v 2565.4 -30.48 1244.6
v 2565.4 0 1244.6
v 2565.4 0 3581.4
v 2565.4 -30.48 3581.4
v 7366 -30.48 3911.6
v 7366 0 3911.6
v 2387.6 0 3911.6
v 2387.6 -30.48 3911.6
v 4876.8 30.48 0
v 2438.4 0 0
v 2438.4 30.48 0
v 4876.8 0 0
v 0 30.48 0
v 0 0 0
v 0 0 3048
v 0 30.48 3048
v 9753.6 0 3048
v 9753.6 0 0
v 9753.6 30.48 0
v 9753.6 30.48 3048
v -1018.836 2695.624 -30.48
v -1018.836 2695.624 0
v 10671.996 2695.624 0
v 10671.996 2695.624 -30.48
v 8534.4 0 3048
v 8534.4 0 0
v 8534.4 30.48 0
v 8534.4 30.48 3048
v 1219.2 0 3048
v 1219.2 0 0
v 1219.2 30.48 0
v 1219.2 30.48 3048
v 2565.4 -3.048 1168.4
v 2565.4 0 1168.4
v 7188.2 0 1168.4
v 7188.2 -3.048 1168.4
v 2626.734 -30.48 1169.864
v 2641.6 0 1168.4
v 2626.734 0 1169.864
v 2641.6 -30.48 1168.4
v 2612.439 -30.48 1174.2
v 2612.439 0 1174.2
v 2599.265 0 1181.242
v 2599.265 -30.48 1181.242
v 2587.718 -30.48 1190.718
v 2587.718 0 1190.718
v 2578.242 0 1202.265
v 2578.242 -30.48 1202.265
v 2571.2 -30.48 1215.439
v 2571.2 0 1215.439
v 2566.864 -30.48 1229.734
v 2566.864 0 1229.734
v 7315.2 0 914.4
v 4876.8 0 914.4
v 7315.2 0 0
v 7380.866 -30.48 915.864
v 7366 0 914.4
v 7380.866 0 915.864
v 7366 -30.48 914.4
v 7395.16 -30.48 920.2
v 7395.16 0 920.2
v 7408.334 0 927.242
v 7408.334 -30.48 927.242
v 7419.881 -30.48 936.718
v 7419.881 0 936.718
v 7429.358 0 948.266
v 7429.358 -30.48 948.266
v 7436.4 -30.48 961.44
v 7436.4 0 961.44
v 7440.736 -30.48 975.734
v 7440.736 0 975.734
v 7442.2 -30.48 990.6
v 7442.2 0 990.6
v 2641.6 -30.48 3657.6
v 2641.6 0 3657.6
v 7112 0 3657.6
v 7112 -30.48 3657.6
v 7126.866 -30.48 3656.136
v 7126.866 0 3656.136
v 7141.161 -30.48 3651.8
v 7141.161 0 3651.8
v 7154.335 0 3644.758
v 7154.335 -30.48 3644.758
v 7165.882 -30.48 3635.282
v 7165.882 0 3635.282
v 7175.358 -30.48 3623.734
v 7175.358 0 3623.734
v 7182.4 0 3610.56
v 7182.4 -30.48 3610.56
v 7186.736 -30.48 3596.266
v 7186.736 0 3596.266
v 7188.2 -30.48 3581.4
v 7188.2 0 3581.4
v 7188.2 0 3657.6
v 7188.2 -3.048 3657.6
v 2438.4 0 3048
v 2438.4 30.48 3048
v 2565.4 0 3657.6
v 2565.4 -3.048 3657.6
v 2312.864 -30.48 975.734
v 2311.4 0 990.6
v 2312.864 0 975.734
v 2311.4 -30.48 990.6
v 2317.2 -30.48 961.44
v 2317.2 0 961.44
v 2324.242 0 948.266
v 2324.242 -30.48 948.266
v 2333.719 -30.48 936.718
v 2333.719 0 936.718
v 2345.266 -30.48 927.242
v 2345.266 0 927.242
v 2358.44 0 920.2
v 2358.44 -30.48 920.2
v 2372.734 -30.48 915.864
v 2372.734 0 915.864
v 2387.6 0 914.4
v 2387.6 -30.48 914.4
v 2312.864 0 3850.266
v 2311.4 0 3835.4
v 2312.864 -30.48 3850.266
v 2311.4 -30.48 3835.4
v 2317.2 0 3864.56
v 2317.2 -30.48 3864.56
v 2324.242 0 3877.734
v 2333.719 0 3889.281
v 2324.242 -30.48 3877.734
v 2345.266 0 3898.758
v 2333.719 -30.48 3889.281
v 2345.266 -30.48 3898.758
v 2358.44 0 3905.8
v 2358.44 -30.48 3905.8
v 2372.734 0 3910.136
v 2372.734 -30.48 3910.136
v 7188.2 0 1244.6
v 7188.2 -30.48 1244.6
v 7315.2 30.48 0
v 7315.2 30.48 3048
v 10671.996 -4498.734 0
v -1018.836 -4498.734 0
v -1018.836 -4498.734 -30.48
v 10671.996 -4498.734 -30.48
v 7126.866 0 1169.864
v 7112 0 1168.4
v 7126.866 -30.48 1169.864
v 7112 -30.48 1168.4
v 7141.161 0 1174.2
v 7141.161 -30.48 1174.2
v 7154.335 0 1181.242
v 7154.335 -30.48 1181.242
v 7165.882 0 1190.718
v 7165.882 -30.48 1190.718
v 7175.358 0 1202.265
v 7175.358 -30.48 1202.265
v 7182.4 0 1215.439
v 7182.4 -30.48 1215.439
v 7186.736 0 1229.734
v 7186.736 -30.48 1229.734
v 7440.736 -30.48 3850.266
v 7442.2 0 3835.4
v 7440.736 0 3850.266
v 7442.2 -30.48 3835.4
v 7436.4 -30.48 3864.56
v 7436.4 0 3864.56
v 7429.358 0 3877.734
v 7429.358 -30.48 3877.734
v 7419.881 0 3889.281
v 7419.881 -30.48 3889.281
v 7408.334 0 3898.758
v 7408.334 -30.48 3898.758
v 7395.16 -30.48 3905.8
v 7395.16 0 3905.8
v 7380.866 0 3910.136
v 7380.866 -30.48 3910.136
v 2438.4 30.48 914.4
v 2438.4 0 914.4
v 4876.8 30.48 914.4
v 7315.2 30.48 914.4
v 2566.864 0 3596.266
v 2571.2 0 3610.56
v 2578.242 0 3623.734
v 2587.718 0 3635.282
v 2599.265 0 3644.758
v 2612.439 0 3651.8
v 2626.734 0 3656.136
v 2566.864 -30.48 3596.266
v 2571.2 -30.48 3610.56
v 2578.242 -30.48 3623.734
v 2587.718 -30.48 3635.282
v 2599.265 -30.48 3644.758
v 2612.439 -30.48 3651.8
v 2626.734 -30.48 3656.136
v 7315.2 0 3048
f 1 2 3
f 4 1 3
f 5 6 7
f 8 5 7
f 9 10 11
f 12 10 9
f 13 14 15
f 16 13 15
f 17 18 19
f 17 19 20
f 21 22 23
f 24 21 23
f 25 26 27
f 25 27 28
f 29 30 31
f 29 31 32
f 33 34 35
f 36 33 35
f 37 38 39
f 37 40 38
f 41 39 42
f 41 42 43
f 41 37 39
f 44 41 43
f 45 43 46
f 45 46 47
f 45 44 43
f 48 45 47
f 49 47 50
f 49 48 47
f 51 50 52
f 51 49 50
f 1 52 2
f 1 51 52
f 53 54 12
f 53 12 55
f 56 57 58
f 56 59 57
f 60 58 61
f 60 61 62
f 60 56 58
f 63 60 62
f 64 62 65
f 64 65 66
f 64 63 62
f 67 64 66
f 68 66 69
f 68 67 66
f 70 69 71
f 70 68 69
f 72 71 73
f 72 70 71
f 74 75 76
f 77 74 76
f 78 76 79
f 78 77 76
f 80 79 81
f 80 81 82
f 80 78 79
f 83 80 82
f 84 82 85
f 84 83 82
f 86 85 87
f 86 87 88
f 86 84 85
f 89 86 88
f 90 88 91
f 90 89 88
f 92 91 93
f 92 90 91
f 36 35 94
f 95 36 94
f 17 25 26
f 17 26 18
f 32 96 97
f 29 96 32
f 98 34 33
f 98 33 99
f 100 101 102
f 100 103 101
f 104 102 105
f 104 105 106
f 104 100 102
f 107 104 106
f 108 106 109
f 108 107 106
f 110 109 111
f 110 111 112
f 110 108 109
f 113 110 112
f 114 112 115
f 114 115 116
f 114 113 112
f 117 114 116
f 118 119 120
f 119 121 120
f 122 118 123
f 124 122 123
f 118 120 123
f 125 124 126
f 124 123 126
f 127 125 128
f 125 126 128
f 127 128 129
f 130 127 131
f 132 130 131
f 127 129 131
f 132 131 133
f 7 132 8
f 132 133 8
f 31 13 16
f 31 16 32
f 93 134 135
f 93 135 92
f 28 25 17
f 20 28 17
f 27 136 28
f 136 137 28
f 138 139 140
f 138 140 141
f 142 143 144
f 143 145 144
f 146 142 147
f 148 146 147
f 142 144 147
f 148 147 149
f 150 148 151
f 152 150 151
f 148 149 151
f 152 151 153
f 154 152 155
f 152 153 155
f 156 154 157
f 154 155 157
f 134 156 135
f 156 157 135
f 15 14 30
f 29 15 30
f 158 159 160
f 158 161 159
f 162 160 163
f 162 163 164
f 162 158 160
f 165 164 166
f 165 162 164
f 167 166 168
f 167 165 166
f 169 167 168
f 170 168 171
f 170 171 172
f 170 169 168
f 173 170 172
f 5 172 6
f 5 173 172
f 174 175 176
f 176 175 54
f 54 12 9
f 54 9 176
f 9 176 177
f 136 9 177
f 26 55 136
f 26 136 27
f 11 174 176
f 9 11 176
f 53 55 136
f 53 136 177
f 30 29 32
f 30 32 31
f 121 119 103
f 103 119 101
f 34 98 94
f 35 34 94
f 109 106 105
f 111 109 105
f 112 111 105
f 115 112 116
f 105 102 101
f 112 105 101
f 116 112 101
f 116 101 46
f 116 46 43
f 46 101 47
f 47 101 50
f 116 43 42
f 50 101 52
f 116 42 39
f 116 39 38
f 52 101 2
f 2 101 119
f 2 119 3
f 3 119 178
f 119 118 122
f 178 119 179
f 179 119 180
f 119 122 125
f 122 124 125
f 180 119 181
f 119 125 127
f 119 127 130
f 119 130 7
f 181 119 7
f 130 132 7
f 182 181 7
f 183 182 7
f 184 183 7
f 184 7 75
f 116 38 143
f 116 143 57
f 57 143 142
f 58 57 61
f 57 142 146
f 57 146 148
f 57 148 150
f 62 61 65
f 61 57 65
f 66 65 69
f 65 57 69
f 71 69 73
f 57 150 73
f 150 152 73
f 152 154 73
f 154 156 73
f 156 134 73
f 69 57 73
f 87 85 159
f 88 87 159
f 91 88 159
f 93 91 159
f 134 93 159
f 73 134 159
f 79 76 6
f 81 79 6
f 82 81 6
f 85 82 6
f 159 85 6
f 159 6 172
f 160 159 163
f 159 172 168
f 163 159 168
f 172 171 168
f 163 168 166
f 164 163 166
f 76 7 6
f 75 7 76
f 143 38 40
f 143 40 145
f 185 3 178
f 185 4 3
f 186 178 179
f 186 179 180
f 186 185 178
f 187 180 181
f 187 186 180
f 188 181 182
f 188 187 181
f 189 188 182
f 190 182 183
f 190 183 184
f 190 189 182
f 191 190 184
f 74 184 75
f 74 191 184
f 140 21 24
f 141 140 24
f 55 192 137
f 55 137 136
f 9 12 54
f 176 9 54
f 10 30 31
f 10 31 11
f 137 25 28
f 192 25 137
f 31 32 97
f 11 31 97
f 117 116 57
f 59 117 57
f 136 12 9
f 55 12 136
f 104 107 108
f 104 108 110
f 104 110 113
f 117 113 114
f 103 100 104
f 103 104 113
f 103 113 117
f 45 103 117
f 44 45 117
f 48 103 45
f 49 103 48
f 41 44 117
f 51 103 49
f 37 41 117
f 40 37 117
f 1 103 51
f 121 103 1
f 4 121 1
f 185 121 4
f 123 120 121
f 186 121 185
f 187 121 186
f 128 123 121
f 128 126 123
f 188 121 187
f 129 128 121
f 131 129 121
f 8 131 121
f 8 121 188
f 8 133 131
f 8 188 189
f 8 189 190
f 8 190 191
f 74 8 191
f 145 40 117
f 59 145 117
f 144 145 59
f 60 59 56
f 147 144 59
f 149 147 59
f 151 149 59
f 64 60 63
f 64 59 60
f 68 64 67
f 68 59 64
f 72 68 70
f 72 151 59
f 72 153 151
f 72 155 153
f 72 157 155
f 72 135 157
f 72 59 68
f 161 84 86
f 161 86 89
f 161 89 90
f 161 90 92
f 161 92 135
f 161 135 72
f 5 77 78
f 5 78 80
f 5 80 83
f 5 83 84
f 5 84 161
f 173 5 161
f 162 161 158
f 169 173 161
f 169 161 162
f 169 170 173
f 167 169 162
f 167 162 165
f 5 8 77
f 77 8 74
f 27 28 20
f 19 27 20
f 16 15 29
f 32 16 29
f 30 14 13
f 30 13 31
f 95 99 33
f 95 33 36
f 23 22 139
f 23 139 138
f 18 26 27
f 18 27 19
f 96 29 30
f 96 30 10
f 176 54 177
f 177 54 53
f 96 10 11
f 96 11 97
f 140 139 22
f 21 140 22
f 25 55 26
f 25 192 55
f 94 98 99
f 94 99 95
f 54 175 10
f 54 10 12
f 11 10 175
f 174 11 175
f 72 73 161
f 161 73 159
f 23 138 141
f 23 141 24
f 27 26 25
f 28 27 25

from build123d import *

# Parameters (mm, degrees)
F0_W     = 1219.2
F0_H     = 3048
F1_DEPTH = 30.48
F0_W_2   = 2438.4
F0_H_2   = 914.4
F0_W_3   = 126.9999492
F0_H_3   = 2133.6
F2_DEPTH = 30.48
F0_W_4   = 4622.8001016
F0_H_4   = 2489.2001016
F3_DEPTH = 30.48
F4_DEPTH = 3.048
F5_R     = 76.2
F6_W     = 11690.8322572708
F6_H     = 7194.3583488464
F7_DEPTH = 30.48


with BuildPart() as f1:
    # F0 (on Front) → F1 (new body)
    with BuildSketch(Plane.XZ):
        with Locations((609.6, 1524)):
            Rectangle(F0_W, F0_H)
    extrude(amount=-F1_DEPTH)


with BuildPart() as f1b:
    # F0 (on Front) → F1, piece 2 (new body)
    with BuildSketch(Plane.XZ):
        with Locations((3657.6, 457.2)):
            Rectangle(F0_W_2, F0_H_2)
    extrude(amount=-F1_DEPTH)


with BuildPart() as f1c:
    # F0 (on Front) → F1, piece 3 (new body)
    with BuildSketch(Plane.XZ):
        Polygon((7315.2, 914.4), (7315.2, 0), (8534.4, 0), (8534.4, 3048), (7442.1999492, 3048), (7442.1999492, 914.4), align=None)
        with Locations((7378.6999746, 1981.2)):
            Rectangle(F0_W_3, F0_H_3)
    extrude(amount=-F1_DEPTH)


with BuildPart() as f2:
    # F0 (on Front) → F2 (new body)
    with BuildSketch(Plane.XZ):
        Polygon((1219.2, 3048), (1219.2, 0), (2438.4, 0), (2438.4, 914.4), (2311.4000508, 914.4), (2311.4000508, 3048), align=None)
        with Locations((2374.9000254, 1981.2)):
            Rectangle(F0_W_3, F0_H_3)
    extrude(amount=-F2_DEPTH)


with BuildPart() as f2b:
    # F0 (on Front) → F2, piece 2 (new body)
    with BuildSketch(Plane.XZ):
        with Locations((6096, 457.2)):
            Rectangle(F0_W_2, F0_H_2)
    extrude(amount=-F2_DEPTH)


with BuildPart() as f2c:
    # F0 (on Front) → F2, piece 3 (new body)
    with BuildSketch(Plane.XZ):
        with Locations((9144, 1524)):
            Rectangle(F0_W, F0_H)
    extrude(amount=-F2_DEPTH)


with BuildPart() as f3:
    # F0 (on Front) → F3 (new body)
    with BuildSketch(Plane.XZ):
        Polygon((2311.4000508, 3911.5998984), (2311.4000508, 3048), (2438.4, 3048), (2438.4, 914.4), (4876.8, 914.4), (7315.2, 914.4), (7315.2, 3048), (7442.1999492, 3048), (7442.1999492, 3911.5998984), align=None)
        with Locations((4876.8, 2412.9999492)):
            Rectangle(F0_W_4, F0_H_4, mode=Mode.SUBTRACT)
        with Locations((2374.9000254, 1981.2)):
            Rectangle(F0_W_3, F0_H_3)
        with Locations((7378.6999746, 1981.2)):
            Rectangle(F0_W_3, F0_H_3)
    extrude(amount=F3_DEPTH)

    # F5
    f5_edges = [f3.edges().sort_by_distance(p)[0] for p in [
        (2311.400051, -15.24, 3911.599898),
        (2565.399949, -15.24, 3657.6),
        (2311.400051, -15.24, 914.4),
        (2565.399949, -15.24, 1168.399898),
        (7442.199949, -15.24, 914.4),
        (7188.200051, -15.24, 1168.399898),
        (7442.199949, -15.24, 3911.599898),
        (7188.200051, -15.24, 3657.6),
    ]]
    fillet(f5_edges, radius=F5_R)


with BuildPart() as f4:
    # F0 (on Front) → F4 (new body)
    with BuildSketch(Plane.XZ):
        with Locations((4876.8, 2412.9999492)):
            Rectangle(F0_W_4, F0_H_4)
    extrude(amount=F4_DEPTH)


with BuildPart() as f7:
    # F6 (on Top) → F7 (new body)
    with BuildSketch(Plane.XY):
        with Locations((4826.5799880028, -901.5548229218)):
            Rectangle(F6_W, F6_H)
    extrude(amount=-F7_DEPTH)


solid = Compound([f1.part, f1b.part, f1c.part, f2.part, f2b.part, f2c.part, f3.part, f4.part, f7.part])
